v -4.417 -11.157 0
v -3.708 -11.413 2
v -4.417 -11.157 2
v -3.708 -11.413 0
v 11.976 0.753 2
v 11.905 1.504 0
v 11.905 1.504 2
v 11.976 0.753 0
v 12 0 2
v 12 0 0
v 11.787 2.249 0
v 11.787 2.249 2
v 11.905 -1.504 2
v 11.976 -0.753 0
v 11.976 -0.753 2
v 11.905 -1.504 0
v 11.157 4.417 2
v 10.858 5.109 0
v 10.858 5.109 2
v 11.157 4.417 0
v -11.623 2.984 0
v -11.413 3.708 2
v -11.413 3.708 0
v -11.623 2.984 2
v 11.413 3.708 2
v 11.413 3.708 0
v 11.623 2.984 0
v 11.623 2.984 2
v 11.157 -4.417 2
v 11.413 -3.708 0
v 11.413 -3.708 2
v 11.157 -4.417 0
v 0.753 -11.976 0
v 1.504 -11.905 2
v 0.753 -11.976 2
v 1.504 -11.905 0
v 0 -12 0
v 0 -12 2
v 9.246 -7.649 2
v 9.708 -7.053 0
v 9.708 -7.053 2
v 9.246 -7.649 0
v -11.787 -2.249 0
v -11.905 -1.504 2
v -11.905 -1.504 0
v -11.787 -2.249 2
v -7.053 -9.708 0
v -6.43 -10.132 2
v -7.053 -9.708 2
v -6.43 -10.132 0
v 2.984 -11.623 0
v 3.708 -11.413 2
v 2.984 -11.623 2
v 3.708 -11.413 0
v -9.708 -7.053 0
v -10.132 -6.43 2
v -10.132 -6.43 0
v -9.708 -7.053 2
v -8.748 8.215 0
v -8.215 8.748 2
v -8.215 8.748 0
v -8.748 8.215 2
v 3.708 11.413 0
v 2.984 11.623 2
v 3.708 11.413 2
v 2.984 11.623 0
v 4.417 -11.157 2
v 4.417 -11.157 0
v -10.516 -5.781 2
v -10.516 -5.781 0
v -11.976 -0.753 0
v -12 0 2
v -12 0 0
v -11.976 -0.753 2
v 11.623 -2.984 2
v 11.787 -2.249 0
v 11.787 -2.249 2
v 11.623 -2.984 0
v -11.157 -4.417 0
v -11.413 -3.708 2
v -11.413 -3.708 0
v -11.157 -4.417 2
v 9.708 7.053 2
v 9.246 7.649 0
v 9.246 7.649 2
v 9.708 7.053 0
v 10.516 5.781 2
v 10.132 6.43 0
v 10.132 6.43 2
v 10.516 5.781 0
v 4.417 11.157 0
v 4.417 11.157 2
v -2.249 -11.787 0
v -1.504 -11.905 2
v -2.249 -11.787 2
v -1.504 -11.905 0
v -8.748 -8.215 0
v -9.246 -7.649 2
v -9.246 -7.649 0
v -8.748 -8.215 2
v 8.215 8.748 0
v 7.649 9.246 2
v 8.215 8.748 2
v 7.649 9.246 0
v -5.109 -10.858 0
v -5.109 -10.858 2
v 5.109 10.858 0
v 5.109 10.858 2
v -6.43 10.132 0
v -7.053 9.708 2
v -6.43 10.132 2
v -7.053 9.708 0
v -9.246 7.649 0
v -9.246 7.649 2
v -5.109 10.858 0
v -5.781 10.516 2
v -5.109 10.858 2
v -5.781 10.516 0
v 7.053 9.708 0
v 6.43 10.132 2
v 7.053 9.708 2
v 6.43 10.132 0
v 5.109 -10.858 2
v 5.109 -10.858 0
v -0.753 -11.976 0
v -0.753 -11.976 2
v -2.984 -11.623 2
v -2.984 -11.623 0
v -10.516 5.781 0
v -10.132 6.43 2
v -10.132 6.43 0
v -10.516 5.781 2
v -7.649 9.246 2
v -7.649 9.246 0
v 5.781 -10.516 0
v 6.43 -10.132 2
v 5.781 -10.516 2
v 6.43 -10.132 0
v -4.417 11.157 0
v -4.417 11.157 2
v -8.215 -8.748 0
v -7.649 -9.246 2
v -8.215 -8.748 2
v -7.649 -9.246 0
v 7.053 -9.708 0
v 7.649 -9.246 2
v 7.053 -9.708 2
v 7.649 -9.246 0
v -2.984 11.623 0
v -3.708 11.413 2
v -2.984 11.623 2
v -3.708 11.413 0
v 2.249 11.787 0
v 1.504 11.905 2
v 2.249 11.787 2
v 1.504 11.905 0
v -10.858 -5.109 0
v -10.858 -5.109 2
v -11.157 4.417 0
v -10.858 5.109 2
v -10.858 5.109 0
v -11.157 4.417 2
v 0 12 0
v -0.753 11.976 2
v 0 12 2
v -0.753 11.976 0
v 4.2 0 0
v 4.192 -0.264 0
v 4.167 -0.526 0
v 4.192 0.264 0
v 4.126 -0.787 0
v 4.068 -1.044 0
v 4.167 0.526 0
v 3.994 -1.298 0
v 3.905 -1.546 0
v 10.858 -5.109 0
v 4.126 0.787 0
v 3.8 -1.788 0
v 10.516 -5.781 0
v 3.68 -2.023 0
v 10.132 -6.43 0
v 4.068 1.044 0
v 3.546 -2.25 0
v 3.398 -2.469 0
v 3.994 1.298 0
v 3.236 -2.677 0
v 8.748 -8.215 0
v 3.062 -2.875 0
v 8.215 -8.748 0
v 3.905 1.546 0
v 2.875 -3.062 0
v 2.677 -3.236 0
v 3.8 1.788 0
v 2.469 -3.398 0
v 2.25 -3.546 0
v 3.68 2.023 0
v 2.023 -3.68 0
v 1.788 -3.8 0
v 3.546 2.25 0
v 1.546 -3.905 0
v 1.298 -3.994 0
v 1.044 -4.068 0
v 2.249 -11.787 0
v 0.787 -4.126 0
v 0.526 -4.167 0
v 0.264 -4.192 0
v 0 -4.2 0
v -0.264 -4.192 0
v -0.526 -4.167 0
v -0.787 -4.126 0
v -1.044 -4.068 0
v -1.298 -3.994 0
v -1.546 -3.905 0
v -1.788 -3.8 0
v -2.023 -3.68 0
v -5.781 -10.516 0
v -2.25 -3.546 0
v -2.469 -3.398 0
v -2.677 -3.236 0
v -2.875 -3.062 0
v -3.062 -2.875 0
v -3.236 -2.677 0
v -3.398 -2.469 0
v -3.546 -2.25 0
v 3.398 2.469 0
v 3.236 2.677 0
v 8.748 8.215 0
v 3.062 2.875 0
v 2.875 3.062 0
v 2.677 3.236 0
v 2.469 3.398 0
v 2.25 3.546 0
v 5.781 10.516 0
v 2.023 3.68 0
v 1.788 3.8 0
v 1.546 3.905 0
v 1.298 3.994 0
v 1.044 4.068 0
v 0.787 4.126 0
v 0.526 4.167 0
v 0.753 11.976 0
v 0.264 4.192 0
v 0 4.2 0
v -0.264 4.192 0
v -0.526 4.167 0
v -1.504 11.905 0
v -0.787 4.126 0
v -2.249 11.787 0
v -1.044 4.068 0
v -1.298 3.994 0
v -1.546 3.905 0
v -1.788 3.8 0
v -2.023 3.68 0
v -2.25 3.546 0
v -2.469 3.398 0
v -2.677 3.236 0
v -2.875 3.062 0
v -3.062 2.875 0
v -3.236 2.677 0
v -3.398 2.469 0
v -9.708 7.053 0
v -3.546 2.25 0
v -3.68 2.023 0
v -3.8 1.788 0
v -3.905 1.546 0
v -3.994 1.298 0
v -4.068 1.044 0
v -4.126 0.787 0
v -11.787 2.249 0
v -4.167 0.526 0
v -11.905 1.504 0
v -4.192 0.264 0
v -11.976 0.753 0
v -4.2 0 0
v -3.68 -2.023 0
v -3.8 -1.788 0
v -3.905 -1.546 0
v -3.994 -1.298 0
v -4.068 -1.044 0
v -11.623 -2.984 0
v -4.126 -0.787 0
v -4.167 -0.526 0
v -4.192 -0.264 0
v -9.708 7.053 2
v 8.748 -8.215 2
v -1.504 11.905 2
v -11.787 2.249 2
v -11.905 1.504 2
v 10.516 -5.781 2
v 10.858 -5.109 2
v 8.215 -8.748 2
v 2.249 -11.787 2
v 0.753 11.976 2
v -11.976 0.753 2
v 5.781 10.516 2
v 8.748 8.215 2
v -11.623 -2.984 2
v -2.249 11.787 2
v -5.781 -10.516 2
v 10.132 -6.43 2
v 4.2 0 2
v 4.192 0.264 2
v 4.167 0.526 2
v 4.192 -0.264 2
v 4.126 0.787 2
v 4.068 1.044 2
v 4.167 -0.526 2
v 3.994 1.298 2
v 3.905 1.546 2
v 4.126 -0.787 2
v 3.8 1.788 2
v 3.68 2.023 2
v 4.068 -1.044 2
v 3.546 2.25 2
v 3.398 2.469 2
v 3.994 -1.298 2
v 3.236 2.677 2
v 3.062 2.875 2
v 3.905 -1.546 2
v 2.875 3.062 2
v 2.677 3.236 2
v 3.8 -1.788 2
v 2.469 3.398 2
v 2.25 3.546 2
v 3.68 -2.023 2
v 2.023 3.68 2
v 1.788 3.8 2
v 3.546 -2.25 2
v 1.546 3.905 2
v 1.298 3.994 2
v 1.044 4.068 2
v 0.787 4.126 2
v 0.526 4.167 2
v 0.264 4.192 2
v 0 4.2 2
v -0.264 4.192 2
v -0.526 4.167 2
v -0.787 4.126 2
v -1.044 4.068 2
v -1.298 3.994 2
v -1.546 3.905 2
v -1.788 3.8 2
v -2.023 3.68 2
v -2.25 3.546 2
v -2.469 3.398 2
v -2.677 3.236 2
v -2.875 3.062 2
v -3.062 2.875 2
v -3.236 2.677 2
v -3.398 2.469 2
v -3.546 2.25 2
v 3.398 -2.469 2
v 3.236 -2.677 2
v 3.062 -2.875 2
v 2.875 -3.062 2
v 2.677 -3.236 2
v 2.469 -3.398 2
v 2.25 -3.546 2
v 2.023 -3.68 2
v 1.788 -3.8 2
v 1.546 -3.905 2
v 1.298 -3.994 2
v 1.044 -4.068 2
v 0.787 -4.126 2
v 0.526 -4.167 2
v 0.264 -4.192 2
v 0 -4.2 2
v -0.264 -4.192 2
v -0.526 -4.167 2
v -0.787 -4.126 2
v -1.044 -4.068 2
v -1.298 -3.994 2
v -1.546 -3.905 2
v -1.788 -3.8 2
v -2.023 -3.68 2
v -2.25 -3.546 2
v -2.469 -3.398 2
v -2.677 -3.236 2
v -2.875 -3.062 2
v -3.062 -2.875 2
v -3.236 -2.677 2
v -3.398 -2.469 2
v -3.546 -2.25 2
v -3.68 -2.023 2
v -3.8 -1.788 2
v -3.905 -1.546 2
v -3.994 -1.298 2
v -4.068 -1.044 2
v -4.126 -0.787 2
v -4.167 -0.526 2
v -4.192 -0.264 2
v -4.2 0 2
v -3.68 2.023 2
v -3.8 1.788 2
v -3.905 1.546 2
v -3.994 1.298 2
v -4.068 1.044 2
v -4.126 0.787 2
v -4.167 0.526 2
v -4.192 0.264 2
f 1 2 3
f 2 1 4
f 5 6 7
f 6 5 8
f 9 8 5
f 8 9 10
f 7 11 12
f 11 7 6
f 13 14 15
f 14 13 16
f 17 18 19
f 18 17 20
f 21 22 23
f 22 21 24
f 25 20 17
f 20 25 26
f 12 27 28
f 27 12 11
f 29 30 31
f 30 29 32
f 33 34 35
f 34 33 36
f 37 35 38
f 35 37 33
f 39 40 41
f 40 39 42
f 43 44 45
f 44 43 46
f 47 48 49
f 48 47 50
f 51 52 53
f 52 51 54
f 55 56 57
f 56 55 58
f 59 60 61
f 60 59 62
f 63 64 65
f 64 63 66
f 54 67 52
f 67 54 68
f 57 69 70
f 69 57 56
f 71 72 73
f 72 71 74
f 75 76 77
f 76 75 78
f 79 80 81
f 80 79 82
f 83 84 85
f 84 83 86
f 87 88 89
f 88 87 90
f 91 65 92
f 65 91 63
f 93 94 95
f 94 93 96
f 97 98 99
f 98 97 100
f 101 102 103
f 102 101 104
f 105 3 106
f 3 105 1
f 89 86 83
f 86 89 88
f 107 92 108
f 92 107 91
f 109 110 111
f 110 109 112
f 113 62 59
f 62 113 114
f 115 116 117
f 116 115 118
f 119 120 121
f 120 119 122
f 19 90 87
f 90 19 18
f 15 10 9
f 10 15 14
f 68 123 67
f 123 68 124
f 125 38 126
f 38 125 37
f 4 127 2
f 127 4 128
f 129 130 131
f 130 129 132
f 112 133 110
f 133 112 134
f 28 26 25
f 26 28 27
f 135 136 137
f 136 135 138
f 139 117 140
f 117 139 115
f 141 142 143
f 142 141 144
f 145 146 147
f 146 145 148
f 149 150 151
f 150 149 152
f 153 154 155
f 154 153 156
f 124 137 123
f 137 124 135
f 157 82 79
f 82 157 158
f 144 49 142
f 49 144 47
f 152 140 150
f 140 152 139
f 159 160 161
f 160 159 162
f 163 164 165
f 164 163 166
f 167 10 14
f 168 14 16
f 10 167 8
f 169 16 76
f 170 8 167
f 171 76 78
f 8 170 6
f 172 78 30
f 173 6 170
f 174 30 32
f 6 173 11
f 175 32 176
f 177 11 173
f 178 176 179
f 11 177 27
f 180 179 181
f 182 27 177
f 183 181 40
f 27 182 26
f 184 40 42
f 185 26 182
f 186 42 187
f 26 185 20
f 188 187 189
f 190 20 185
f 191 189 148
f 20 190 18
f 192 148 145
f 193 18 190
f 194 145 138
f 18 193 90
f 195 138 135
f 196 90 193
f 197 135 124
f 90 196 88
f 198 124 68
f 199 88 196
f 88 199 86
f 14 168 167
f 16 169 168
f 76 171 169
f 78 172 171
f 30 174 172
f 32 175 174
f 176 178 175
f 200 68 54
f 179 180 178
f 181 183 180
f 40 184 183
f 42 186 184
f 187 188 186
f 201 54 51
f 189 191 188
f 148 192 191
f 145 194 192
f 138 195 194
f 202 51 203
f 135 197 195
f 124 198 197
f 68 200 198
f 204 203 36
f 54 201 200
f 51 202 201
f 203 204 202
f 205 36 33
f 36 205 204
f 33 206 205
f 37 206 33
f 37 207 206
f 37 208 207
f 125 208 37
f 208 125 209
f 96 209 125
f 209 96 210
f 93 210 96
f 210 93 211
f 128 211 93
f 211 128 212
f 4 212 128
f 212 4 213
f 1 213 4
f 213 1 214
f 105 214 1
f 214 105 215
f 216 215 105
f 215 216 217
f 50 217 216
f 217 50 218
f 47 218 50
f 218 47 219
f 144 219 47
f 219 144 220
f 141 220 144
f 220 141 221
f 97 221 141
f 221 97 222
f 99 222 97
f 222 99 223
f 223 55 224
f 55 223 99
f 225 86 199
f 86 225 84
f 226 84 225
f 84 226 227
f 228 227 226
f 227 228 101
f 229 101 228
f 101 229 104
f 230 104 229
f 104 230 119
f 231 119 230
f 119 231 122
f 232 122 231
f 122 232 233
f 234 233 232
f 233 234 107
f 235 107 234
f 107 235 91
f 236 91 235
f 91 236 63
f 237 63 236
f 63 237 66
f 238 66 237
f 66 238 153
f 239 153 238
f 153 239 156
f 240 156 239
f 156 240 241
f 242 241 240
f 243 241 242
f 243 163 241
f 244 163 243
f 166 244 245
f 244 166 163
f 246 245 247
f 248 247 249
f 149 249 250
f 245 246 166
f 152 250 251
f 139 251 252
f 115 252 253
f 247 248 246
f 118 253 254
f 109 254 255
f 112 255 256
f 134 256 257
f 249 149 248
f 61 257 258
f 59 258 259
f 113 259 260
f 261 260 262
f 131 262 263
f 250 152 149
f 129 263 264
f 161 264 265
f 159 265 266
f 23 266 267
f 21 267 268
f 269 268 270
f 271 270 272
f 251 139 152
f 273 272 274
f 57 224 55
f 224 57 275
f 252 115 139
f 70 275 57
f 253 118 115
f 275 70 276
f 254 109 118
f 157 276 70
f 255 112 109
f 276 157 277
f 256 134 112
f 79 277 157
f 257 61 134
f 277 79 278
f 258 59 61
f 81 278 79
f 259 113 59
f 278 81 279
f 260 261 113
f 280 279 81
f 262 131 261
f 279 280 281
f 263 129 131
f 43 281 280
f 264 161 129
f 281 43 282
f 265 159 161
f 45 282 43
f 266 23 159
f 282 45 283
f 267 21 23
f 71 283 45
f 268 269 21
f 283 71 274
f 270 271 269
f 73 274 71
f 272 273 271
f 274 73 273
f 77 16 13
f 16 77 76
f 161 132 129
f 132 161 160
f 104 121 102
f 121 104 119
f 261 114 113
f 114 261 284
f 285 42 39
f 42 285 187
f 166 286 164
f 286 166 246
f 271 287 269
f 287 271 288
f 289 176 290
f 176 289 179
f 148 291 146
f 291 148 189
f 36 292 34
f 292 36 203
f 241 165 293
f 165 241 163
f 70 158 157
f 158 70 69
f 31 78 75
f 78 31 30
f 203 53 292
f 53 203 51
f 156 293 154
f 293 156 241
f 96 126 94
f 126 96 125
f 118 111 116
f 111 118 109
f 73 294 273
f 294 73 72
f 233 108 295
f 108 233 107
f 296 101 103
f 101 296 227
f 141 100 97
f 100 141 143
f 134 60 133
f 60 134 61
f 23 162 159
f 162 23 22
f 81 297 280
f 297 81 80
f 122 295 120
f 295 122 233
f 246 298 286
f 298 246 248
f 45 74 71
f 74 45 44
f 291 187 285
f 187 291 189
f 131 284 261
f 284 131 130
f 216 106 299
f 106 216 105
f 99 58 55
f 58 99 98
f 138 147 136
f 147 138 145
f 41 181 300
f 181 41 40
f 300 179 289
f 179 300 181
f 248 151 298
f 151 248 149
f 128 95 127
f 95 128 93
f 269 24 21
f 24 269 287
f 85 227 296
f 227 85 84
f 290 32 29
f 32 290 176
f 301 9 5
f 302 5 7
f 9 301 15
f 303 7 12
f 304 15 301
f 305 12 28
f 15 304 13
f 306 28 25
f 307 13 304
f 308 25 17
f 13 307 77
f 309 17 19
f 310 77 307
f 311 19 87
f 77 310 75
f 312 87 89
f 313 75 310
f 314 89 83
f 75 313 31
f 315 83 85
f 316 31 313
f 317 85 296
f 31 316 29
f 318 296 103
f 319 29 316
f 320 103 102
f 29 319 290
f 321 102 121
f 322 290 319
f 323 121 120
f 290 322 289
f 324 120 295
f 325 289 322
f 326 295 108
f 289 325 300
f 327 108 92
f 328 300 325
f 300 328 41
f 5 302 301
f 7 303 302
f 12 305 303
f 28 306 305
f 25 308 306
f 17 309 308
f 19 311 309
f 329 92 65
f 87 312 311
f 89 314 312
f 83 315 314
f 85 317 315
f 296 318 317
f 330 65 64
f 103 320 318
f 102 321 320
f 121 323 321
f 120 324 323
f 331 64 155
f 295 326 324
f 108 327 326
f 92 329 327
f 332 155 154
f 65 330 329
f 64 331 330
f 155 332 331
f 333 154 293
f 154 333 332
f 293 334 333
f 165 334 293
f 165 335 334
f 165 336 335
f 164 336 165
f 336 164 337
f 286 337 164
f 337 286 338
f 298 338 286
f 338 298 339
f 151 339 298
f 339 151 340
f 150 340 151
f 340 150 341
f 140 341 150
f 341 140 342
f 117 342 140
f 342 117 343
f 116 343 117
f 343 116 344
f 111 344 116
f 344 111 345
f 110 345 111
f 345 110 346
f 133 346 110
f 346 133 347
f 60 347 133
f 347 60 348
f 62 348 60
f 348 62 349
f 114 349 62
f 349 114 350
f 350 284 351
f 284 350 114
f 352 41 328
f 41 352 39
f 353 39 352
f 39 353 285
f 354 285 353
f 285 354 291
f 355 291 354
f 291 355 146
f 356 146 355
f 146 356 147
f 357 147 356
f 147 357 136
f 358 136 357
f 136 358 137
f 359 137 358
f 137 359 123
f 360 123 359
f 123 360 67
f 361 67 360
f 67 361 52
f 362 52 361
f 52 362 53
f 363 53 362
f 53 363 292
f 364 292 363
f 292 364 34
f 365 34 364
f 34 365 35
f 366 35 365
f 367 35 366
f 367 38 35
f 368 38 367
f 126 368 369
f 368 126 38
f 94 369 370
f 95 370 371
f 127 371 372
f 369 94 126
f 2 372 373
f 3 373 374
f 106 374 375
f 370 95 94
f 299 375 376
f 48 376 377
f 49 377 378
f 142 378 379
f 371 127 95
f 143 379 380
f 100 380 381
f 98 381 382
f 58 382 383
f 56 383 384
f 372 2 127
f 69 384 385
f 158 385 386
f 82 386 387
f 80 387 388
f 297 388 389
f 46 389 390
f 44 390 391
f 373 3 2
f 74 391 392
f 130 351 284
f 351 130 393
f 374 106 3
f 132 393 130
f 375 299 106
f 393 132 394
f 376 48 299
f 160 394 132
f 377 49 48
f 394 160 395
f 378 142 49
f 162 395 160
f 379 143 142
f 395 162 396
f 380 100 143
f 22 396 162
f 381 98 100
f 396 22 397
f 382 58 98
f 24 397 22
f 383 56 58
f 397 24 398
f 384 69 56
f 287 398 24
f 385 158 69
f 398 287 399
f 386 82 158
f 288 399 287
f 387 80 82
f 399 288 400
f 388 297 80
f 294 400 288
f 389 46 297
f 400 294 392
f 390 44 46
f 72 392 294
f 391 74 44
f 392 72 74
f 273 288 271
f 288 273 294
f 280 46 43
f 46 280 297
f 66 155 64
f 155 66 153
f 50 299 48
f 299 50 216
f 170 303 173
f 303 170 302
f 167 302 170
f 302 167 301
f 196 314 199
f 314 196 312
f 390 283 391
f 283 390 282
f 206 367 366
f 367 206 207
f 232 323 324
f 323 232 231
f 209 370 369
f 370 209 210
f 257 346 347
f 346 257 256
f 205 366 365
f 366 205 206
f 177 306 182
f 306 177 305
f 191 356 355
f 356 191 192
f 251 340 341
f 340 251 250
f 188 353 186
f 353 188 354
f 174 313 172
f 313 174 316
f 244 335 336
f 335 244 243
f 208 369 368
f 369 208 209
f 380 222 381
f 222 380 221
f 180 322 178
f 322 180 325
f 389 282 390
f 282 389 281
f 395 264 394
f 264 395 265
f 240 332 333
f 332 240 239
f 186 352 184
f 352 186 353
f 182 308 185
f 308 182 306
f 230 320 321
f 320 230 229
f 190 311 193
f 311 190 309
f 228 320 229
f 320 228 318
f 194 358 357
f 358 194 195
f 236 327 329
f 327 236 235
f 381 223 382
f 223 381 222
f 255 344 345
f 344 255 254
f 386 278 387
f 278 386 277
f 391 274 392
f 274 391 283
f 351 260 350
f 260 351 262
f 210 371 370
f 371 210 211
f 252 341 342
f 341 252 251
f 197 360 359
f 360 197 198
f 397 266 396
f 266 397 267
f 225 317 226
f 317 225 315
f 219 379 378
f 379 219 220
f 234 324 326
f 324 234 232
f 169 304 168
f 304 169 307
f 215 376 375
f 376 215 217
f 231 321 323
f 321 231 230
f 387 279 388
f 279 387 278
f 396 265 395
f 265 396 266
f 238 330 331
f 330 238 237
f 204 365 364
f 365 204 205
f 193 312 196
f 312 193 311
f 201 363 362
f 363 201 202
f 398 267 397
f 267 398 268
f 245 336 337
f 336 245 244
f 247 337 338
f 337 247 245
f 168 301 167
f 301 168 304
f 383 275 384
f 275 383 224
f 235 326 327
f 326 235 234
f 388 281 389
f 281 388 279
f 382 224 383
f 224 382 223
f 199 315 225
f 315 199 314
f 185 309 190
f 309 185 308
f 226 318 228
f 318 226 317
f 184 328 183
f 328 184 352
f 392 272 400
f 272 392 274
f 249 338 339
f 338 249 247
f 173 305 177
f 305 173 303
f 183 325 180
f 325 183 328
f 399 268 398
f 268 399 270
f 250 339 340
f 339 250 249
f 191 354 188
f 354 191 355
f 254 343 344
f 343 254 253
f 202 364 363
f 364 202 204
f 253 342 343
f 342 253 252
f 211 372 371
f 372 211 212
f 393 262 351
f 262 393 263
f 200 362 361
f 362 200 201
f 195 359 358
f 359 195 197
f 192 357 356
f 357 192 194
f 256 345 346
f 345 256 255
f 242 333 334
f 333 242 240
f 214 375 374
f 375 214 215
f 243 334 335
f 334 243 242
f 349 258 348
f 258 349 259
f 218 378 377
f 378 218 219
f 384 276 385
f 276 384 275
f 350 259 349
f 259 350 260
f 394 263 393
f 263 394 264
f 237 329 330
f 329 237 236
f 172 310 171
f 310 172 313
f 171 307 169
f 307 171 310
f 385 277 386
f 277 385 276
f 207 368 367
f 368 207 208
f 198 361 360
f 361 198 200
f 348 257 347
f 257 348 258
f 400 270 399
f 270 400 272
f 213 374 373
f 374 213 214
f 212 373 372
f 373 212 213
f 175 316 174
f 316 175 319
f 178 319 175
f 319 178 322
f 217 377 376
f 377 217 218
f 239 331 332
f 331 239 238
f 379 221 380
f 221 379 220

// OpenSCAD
$fn=100;

difference() {
    cylinder(h=2, r=12);
    cylinder(h=2, r=4.2);
}
